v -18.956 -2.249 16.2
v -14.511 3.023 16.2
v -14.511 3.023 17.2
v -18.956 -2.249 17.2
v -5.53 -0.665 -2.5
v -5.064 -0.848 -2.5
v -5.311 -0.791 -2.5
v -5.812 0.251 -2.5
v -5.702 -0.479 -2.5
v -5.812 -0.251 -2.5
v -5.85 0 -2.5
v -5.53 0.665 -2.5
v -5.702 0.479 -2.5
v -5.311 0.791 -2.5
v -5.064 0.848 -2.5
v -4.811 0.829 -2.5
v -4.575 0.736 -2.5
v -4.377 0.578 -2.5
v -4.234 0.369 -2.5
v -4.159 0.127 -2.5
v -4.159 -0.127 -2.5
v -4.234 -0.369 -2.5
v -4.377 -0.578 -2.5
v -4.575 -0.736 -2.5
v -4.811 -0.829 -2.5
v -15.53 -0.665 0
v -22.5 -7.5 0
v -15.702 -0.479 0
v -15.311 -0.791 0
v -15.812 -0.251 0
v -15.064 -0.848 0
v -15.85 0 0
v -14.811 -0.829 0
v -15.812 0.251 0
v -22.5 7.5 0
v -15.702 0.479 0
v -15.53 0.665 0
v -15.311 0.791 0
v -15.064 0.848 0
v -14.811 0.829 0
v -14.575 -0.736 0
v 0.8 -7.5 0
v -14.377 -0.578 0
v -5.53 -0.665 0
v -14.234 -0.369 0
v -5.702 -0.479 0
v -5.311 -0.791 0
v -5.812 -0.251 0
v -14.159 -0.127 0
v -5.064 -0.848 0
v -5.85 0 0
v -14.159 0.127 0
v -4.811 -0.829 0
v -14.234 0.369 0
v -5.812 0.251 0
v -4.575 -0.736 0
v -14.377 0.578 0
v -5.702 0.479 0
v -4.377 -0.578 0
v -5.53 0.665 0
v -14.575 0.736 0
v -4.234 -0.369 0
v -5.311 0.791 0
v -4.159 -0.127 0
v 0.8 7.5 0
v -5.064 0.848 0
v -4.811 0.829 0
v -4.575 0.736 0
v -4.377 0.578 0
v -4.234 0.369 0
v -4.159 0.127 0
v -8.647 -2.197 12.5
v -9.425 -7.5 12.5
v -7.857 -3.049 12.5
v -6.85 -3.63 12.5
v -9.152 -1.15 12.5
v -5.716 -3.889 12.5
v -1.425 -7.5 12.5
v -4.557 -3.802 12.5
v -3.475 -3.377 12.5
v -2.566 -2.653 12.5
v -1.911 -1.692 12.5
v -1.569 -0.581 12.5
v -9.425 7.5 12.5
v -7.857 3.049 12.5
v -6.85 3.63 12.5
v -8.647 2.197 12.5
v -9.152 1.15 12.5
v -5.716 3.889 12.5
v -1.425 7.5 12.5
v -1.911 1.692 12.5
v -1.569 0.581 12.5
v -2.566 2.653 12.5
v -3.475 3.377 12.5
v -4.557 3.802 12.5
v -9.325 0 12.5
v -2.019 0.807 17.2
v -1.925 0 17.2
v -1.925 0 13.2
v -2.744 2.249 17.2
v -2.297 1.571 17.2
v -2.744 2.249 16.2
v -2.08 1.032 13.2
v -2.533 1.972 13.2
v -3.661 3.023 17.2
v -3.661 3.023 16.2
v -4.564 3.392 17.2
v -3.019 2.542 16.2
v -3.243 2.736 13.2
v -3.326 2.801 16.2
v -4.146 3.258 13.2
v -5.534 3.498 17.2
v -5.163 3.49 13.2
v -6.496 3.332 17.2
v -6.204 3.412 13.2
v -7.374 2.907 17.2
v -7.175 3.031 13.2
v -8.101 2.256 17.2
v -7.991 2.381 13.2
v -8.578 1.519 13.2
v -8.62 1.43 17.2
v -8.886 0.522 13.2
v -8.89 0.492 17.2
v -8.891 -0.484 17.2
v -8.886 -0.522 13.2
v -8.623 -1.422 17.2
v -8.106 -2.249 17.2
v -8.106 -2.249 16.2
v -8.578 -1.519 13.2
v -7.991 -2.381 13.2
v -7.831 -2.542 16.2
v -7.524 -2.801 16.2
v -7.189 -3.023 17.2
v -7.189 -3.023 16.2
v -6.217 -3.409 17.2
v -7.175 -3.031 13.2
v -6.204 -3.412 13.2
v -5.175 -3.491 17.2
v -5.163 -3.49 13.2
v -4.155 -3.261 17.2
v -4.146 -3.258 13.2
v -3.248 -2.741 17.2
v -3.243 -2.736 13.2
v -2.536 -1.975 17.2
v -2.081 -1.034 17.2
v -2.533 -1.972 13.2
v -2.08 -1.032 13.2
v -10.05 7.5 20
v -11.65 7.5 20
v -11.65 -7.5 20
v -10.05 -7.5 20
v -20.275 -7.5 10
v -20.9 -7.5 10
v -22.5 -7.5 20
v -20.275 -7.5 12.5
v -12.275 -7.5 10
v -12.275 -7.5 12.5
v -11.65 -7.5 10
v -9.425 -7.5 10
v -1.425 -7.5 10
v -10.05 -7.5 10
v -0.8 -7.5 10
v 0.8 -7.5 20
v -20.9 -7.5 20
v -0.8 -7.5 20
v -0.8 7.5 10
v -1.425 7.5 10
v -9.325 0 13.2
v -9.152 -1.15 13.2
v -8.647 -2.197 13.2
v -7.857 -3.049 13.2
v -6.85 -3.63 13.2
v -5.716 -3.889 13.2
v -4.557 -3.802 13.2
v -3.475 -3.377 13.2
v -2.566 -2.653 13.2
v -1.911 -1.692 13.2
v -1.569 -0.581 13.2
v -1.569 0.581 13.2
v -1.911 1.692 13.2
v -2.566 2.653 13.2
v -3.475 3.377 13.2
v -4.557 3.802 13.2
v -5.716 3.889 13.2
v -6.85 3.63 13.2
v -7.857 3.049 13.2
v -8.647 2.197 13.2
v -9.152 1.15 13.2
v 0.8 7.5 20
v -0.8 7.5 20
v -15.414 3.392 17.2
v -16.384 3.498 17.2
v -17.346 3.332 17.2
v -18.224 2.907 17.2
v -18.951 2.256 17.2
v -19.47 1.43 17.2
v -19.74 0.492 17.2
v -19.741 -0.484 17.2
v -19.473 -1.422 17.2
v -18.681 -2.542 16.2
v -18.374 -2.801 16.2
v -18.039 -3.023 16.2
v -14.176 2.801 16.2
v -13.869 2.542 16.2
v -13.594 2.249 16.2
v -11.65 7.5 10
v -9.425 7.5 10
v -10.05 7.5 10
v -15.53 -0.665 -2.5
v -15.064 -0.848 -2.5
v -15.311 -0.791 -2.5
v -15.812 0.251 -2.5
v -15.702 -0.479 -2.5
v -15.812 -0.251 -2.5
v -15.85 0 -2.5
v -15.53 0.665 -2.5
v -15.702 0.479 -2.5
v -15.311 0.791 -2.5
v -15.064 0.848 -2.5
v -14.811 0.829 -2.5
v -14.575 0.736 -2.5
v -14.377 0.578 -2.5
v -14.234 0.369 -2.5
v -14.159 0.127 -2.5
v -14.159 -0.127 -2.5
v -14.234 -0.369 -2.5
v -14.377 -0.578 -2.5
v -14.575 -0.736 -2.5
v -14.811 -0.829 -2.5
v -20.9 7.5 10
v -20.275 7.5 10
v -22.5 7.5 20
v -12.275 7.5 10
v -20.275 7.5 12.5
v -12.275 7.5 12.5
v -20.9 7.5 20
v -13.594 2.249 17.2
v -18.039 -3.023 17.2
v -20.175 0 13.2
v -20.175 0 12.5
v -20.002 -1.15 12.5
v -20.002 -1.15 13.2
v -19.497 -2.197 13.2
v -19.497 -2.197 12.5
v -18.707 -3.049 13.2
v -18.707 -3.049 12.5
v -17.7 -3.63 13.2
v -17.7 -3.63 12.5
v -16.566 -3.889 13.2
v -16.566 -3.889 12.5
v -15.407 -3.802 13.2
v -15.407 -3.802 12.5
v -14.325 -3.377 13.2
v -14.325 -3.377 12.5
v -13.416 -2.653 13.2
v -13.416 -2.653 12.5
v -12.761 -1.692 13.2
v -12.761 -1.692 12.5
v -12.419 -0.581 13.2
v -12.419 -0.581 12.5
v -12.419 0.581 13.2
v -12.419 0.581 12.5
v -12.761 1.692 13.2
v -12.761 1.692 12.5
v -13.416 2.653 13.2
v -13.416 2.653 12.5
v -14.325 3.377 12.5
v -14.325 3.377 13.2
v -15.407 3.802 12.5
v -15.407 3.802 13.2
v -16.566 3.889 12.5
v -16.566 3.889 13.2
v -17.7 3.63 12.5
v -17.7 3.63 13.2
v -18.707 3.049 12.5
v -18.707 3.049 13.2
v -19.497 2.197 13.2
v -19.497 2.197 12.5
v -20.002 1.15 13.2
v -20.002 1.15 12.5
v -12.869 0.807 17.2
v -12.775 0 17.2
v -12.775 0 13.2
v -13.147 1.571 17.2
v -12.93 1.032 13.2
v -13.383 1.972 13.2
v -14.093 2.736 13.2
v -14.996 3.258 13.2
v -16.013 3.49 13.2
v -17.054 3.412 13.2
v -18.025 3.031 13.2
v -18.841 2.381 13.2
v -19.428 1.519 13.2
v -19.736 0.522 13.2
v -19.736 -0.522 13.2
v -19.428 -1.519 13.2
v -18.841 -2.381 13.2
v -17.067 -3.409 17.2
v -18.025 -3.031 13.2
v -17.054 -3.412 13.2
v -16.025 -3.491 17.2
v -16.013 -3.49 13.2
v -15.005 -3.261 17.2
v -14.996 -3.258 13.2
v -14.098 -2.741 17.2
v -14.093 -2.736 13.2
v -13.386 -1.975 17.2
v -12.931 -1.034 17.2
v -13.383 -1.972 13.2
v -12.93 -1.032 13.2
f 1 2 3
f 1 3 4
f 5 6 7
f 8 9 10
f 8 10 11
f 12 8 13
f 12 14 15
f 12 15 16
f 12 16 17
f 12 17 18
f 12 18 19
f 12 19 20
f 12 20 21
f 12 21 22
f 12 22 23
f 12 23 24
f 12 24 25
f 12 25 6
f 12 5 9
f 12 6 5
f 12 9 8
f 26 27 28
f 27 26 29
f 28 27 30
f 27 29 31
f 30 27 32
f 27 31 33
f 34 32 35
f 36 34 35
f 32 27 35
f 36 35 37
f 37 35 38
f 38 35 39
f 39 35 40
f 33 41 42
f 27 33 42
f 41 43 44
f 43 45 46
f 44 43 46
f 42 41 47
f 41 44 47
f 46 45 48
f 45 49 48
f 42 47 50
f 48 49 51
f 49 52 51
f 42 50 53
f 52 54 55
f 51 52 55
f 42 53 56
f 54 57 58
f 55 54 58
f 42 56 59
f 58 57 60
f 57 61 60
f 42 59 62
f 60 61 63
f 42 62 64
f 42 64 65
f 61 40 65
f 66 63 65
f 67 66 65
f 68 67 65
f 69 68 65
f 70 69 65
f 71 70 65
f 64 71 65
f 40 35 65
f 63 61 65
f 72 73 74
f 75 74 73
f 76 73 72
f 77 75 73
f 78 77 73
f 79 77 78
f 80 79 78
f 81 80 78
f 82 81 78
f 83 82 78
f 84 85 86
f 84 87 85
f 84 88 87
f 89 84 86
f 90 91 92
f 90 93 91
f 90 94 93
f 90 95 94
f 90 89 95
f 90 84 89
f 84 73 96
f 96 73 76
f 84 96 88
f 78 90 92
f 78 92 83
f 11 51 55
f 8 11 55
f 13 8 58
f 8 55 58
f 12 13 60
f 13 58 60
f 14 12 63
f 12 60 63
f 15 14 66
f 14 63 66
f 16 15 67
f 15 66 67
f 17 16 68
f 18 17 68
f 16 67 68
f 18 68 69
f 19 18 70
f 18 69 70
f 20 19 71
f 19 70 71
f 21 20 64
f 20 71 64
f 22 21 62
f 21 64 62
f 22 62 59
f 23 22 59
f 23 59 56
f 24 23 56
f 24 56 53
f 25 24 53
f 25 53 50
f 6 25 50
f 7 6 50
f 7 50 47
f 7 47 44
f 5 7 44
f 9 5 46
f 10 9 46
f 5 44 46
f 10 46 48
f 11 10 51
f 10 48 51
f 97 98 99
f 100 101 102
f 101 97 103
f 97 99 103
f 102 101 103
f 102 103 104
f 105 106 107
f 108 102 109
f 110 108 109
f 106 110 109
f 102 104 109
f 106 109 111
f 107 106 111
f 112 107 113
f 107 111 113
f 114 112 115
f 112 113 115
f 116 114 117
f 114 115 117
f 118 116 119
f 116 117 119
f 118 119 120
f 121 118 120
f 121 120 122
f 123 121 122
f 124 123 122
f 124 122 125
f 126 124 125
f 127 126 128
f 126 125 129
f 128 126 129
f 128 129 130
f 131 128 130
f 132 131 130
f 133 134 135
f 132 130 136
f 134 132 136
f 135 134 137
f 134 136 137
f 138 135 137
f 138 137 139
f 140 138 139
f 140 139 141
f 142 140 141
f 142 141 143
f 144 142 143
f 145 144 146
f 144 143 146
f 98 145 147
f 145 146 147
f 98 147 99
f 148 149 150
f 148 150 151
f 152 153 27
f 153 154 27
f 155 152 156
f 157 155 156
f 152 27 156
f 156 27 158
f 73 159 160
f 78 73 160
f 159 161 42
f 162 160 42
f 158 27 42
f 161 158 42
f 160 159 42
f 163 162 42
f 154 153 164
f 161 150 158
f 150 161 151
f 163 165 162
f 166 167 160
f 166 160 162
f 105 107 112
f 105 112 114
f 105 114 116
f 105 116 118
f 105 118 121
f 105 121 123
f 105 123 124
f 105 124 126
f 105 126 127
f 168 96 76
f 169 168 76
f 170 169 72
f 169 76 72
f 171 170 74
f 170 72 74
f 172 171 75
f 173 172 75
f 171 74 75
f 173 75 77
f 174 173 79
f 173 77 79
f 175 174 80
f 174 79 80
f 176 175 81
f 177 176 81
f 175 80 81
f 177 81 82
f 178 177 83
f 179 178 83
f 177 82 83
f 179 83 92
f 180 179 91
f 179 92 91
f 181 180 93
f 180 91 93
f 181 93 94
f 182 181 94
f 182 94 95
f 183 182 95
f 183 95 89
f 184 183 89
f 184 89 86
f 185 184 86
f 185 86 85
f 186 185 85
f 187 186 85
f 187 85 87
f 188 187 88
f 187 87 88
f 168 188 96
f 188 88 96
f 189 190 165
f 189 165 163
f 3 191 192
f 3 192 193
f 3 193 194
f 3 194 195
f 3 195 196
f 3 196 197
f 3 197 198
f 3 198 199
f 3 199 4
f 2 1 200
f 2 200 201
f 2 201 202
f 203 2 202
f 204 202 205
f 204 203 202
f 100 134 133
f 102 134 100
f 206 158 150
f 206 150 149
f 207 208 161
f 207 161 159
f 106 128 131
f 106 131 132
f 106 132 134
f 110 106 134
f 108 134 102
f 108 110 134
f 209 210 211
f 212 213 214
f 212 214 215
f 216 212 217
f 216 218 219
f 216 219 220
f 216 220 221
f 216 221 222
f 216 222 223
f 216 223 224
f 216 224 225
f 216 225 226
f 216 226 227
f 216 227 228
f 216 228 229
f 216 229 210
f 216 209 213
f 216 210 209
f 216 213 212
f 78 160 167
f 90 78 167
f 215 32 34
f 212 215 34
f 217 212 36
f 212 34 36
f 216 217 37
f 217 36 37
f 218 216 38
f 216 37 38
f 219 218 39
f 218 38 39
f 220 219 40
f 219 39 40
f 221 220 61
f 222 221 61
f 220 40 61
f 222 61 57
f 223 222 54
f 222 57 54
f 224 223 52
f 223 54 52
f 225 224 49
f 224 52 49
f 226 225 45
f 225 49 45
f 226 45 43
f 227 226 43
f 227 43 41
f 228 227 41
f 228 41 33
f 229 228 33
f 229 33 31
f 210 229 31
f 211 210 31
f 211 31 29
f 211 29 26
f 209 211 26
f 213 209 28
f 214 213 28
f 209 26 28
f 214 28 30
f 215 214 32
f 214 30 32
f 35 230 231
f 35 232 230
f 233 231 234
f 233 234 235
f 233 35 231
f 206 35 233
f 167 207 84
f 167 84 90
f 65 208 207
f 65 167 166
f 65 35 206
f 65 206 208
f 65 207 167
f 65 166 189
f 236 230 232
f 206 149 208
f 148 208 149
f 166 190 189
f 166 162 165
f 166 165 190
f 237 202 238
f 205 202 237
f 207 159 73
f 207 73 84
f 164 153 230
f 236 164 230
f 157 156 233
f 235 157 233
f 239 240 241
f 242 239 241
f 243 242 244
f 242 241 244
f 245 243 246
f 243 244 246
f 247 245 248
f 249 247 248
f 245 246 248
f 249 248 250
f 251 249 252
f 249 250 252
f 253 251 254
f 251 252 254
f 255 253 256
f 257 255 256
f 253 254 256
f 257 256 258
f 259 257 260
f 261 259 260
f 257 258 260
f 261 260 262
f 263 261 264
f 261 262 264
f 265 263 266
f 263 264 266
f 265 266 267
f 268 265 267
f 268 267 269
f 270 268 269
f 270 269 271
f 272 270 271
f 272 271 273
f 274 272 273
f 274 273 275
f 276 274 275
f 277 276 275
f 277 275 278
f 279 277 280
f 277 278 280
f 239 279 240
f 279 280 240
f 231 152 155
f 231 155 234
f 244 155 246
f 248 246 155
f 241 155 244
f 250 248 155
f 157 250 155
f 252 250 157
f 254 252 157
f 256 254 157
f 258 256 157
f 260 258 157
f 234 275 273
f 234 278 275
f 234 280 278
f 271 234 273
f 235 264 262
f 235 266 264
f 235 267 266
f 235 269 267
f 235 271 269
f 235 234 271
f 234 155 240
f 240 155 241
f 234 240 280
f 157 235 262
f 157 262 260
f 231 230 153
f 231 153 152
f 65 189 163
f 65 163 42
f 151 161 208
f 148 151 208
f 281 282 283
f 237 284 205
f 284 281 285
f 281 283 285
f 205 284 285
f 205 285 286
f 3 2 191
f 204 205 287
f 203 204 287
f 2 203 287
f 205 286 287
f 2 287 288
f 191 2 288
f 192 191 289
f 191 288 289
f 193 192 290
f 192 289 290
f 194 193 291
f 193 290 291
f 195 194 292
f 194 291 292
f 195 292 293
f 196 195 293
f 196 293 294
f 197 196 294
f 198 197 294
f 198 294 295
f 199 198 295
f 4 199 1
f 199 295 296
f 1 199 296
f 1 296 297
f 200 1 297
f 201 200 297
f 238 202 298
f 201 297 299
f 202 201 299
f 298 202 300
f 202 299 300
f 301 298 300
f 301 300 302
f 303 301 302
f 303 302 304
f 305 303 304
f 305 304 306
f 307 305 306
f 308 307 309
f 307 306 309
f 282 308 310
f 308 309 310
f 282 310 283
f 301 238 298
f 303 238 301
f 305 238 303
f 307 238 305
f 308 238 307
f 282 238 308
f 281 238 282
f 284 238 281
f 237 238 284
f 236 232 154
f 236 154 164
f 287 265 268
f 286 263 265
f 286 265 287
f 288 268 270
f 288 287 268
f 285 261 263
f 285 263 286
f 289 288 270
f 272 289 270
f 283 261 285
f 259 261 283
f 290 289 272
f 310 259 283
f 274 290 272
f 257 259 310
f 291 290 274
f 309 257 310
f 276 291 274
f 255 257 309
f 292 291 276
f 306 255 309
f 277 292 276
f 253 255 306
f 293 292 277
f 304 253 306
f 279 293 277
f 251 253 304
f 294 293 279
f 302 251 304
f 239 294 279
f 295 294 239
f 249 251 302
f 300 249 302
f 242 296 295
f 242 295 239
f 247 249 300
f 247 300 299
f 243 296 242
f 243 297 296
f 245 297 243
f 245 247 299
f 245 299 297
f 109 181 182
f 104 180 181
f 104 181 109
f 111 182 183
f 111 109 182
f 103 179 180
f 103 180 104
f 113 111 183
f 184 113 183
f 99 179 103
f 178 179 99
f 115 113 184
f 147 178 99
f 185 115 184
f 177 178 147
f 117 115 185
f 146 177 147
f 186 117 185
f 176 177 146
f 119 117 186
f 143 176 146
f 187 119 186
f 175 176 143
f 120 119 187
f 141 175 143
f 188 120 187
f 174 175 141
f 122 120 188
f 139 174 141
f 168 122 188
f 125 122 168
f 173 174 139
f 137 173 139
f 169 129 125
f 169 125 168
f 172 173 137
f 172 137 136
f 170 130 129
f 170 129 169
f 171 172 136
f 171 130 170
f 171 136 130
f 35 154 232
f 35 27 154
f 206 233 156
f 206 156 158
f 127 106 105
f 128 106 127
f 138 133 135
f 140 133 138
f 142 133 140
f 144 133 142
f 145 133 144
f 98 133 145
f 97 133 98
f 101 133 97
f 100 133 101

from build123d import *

# Parameters (mm, degrees)
SKETCH_1_W          = 45
SKETCH_1_H          = 15
EXTRUDE_1_DEPTH     = 10
SKETCH_2_W          = 1.6
SKETCH_2_H          = 15
EXTRUDE_2_DEPTH     = 10
SKETCH_3_W          = 8
SKETCH_3_H          = 15
EXTRUDE_3_DEPTH     = 2.5
SKETCH_4_R          = 3.9
EXTRUDE_4_DEPTH     = 0.7
SKETCH_6_R          = 3.5
EXTRUDE_5_DEPTH     = 4
CUT_EXTRUDE_START   = -1
CUT_EXTRUDE_1_DEPTH = 1
SKETCH_8_R          = 0.85
EXTRUDE_6_DEPTH     = 2.5
SKETCH_9_W          = 28.344633457
SKETCH_9_H          = 24.026198997
CUT_EXTRUDE_2_DEPTH = 21.7


with BuildPart() as part:
    # Эскиз1 → Вытянуть1 (new body)
    with BuildSketch(Plane.XY):
        Rectangle(SKETCH_1_W, SKETCH_1_H)
    extrude(amount=EXTRUDE_1_DEPTH)

    # Эскиз2 → Вытянуть2 (add)
    with BuildSketch(Plane.XY.offset(10)):
        with Locations((-21.7, 0)):
            Rectangle(SKETCH_2_W, SKETCH_2_H)
        with Locations((-10.85, 0)):
            Rectangle(SKETCH_2_W, SKETCH_2_H)
        Rectangle(SKETCH_2_W, SKETCH_2_H)
        with Locations((10.85, 0)):
            Rectangle(SKETCH_2_W, SKETCH_2_H)
        with Locations((21.7, 0)):
            Rectangle(SKETCH_2_W, SKETCH_2_H)
    extrude(amount=EXTRUDE_2_DEPTH)

    # Эскиз3 → Вытянуть3 (add)
    with BuildSketch(Plane.XY.offset(10)):
        with Locations((-16.275, 0)):
            Rectangle(SKETCH_3_W, SKETCH_3_H)
        with Locations((-5.425, 0)):
            Rectangle(SKETCH_3_W, SKETCH_3_H)
        with Locations((5.425, 0)):
            Rectangle(SKETCH_3_W, SKETCH_3_H)
        with Locations((16.275, 0)):
            Rectangle(SKETCH_3_W, SKETCH_3_H)
    extrude(amount=EXTRUDE_3_DEPTH)

    # Эскиз4 → Вытянуть4 (add)
    with BuildSketch(Plane.XY.offset(12.5)):
        with Locations(Location((-16.275, 0, 0), (0, 0, 180))):
            Circle(SKETCH_4_R)
        with Locations(Location((-5.425, 0, 0), (0, 0, 180))):
            Circle(SKETCH_4_R)
        with Locations(Location((5.425, 0, 0), (0, 0, 180))):
            Circle(SKETCH_4_R)
        with Locations(Location((16.275, 0, 0), (0, 0, 180))):
            Circle(SKETCH_4_R)
    extrude(amount=EXTRUDE_4_DEPTH)

    # Эскиз6 → Вытянуть5 (add)
    with BuildSketch(Plane.XY.offset(13.2)):
        with Locations((-16.275, 0)):
            Circle(SKETCH_6_R)
        with Locations((-5.425, 0)):
            Circle(SKETCH_6_R)
        with Locations((5.425, 0)):
            Circle(SKETCH_6_R)
        with Locations((16.275, 0)):
            Circle(SKETCH_6_R)
    extrude(amount=EXTRUDE_5_DEPTH)

    # Эскиз7 → Вырез-Вытянуть1 (cut)
    with BuildSketch(Plane.XY.offset(17.2).offset(CUT_EXTRUDE_START)):
        with BuildLine():
            Line((-14.510977508, 3.02294966), (-18.956438169, -2.24941978))
            ThreePointArc((-18.956438169, -2.24941978), (-18.531128818, -2.675795724), (-18.039022492, -3.02294966))
            Line((-18.039022492, -3.02294966), (-13.593561831, 2.24941978))
            ThreePointArc((-13.593561831, 2.24941978), (-14.018871182, 2.675795724), (-14.510977508, 3.02294966))
        make_face()
        with BuildLine():
            Line((-3.660977508, 3.02294966), (-8.106438169, -2.24941978))
            ThreePointArc((-8.106438169, -2.24941978), (-7.681128818, -2.675795724), (-7.189022492, -3.02294966))
            Line((-7.189022492, -3.02294966), (-2.743561831, 2.24941978))
            ThreePointArc((-2.743561831, 2.24941978), (-3.168871182, 2.675795724), (-3.660977508, 3.02294966))
        make_face()
        with BuildLine():
            Line((7.189022492, 3.02294966), (2.743561831, -2.24941978))
            ThreePointArc((2.743561831, -2.24941978), (3.168871182, -2.675795724), (3.660977508, -3.02294966))
            Line((3.660977508, -3.02294966), (8.106438169, 2.24941978))
            ThreePointArc((8.106438169, 2.24941978), (7.681128818, 2.675795724), (7.189022492, 3.02294966))
        make_face()
        with BuildLine():
            Line((18.039022492, 3.02294966), (13.593561831, -2.24941978))
            ThreePointArc((13.593561831, -2.24941978), (14.018871182, -2.675795724), (14.510977508, -3.02294966))
            Line((14.510977508, -3.02294966), (18.956438169, 2.24941978))
            ThreePointArc((18.956438169, 2.24941978), (18.531128818, 2.675795724), (18.039022492, 3.02294966))
        make_face()
    extrude(amount=CUT_EXTRUDE_1_DEPTH, mode=Mode.SUBTRACT)

    # Эскиз8 → Вытянуть6 (add)
    with BuildSketch(Plane(origin=(0, 0, 0), x_dir=(-1, 0, 0), z_dir=(0, 0, -1))):
        with Locations((-5, 0)):
            Circle(SKETCH_8_R)
        with Locations((5, 0)):
            Circle(SKETCH_8_R)
        with Locations((15, 0)):
            Circle(SKETCH_8_R)
        with Locations((-15, 0)):
            Circle(SKETCH_8_R)
    extrude(amount=EXTRUDE_6_DEPTH)

    # Эскиз9 → Вырез-Вытянуть2 (cut)
    with BuildSketch(Plane(origin=(22.5, 0, 0), x_dir=(0, 0, -1), z_dir=(1, 0, 0))):
        with Locations((-8.887417233, 0.294438713)):
            Rectangle(SKETCH_9_W, SKETCH_9_H)
    extrude(amount=-CUT_EXTRUDE_2_DEPTH, mode=Mode.SUBTRACT)


solid = part.part
